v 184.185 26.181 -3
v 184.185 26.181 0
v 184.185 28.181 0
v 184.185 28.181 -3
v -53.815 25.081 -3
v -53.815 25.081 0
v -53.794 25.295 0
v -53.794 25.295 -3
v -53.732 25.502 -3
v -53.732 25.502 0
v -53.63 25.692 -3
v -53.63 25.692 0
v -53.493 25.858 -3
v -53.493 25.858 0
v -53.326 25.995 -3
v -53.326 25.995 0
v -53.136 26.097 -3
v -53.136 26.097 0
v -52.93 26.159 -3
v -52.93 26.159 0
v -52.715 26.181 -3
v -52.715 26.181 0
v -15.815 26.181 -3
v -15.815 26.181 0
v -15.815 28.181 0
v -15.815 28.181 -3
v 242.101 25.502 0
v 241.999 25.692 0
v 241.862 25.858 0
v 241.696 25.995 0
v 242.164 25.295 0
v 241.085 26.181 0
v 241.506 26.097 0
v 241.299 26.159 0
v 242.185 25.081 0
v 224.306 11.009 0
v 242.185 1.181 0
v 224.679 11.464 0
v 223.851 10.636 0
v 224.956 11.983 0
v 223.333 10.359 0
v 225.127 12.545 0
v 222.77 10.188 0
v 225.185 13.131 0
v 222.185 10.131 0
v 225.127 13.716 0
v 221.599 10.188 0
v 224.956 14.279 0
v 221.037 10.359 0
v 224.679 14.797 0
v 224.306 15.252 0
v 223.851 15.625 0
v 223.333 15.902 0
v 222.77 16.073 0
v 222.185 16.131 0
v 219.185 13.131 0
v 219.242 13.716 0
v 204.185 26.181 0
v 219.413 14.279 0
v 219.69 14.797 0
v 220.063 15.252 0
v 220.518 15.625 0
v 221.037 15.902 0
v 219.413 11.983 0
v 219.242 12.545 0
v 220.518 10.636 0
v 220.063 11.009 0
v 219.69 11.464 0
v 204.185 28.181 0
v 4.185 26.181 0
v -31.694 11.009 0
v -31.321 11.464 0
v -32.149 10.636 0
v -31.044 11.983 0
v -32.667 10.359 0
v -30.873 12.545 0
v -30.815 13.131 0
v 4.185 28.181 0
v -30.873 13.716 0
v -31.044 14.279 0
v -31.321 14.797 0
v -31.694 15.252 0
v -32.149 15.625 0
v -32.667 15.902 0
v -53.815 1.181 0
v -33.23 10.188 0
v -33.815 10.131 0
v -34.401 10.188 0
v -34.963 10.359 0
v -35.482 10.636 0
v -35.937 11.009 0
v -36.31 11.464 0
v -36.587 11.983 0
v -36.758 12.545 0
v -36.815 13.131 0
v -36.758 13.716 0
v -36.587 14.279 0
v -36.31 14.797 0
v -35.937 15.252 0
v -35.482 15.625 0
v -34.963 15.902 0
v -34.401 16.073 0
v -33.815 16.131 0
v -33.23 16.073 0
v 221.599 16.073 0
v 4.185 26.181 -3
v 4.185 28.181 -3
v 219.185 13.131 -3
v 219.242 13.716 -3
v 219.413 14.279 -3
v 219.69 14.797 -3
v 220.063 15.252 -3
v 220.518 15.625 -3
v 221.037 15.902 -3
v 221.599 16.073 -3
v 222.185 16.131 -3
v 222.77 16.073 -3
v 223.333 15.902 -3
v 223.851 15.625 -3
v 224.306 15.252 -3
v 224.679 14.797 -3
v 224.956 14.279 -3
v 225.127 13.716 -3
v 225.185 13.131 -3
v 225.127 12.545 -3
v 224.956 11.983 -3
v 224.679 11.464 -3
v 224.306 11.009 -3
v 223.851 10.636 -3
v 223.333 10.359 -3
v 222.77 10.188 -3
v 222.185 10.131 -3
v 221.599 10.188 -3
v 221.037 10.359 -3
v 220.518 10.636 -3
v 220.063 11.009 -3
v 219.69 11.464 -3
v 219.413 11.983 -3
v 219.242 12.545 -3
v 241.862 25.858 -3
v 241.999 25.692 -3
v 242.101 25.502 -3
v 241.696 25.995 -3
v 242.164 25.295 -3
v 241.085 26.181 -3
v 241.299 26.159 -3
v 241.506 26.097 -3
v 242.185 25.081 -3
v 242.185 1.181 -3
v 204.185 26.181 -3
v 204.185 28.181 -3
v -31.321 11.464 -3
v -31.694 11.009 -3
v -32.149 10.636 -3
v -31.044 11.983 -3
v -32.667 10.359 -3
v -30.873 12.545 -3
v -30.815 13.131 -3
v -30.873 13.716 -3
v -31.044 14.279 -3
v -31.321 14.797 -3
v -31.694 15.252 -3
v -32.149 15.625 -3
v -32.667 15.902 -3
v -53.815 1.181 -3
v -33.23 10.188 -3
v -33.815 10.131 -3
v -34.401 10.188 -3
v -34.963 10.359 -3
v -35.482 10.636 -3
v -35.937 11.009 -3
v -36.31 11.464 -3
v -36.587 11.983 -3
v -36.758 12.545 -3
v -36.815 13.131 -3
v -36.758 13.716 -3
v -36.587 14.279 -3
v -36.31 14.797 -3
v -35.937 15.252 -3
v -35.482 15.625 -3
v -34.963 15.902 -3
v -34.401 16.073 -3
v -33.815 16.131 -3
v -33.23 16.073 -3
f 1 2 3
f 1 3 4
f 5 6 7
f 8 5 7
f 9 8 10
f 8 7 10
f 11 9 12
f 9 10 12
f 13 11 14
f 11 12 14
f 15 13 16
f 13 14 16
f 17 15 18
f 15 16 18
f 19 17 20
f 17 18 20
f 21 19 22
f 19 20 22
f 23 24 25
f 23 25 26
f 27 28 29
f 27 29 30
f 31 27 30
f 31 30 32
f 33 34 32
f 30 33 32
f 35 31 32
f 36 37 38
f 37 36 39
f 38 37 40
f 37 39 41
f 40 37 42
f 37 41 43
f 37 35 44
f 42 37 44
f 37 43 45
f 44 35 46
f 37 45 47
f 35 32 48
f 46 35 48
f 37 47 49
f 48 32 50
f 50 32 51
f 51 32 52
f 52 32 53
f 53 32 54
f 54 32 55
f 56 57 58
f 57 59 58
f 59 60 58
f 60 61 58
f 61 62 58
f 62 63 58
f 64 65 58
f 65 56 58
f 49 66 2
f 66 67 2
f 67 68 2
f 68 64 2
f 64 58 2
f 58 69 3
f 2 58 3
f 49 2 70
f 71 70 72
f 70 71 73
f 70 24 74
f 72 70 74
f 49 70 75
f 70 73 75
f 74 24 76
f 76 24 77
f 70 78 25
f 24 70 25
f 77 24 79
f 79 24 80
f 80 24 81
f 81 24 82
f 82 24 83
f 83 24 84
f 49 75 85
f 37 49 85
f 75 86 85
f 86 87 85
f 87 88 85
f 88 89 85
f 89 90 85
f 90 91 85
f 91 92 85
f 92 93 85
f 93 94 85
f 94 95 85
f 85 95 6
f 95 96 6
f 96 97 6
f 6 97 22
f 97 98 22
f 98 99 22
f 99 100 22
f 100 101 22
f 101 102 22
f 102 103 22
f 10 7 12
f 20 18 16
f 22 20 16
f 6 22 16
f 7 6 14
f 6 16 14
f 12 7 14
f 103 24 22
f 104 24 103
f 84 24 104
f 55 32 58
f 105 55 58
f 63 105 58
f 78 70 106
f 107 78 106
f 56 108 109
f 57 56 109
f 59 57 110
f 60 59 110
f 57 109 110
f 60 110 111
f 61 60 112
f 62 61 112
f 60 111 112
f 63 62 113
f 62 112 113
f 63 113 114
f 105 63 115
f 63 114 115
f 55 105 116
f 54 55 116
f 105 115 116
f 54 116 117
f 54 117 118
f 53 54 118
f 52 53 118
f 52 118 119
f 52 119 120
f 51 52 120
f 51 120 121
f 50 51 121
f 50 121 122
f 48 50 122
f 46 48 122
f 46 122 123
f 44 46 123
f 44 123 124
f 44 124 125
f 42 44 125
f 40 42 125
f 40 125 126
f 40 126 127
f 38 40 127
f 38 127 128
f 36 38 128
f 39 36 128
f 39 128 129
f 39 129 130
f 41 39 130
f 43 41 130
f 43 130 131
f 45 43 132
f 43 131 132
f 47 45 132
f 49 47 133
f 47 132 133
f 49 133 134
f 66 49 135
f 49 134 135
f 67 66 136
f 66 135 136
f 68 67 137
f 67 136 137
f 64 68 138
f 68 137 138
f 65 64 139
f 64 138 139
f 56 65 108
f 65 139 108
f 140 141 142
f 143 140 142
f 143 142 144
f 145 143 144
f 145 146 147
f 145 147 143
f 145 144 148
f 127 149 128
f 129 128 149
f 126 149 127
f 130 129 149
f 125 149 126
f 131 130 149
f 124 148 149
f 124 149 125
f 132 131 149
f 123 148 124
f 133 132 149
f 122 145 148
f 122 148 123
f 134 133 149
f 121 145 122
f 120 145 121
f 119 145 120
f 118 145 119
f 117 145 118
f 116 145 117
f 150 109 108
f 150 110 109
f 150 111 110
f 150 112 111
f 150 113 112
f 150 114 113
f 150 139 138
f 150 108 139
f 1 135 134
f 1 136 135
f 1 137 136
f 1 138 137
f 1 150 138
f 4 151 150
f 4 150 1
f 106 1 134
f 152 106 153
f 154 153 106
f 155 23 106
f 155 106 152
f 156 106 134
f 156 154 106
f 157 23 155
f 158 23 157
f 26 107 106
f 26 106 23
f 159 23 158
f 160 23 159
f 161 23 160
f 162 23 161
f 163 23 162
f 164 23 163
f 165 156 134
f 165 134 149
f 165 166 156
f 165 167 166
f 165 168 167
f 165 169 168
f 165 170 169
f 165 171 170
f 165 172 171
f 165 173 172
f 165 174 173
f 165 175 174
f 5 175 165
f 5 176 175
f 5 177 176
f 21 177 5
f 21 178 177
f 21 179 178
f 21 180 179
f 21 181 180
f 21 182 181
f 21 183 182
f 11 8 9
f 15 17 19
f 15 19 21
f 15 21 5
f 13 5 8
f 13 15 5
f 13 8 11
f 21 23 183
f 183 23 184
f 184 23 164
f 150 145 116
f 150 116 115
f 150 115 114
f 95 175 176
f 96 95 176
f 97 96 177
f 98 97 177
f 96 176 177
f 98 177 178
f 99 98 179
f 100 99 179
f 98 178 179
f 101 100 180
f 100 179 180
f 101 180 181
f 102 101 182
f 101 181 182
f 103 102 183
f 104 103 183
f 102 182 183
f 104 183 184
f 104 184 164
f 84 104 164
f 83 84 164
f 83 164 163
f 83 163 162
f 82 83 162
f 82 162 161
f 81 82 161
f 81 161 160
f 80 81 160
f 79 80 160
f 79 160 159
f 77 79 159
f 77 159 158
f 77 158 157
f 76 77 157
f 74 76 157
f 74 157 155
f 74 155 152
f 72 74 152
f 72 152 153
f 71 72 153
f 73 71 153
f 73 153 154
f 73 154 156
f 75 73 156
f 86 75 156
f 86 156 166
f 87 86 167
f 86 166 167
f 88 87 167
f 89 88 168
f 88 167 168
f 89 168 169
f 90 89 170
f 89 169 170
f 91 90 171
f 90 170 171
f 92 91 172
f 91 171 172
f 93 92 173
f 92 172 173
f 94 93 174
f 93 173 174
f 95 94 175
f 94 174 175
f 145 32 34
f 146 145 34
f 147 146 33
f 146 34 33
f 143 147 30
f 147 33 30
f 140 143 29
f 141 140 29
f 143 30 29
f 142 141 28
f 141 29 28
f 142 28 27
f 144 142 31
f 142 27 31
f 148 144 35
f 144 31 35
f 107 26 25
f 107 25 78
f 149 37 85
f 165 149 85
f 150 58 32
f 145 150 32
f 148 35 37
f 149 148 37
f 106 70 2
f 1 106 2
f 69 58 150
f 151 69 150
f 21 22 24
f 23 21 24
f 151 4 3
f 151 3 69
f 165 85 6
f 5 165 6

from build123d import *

# Parameters (mm, degrees)
SM_BASE_FLANGE_1_DEPTH = 3
SKETCH_4_W             = 20
SKETCH_4_H             = 3
EXTRUDE_1_DEPTH        = 2
SKETCH_5_R             = 3
CUT_EXTRUDE_1_DEPTH    = 10


# Sheet-metal steps are written as plain solids
with BuildPart() as part:
    # Sketch 1 → Базовая кромка1 (new body)
    with BuildSketch(Plane.XY):
        with BuildLine():
            Line((-52.715343227, 26.180564784), (241.084656773, 26.180564784))
            ThreePointArc((241.084656773, 26.180564784), (241.862474232, 25.858382243), (242.184656773, 25.080564784))
            Line((242.184656773, 25.080564784), (242.184656773, 1.180564784))
            Line((242.184656773, 1.180564784), (-53.815343227, 1.180564784))
            Line((-53.815343227, 1.180564784), (-53.815343227, 25.080564784))
            ThreePointArc((-53.815343227, 25.080564784), (-53.493160687, 25.858382243), (-52.715343227, 26.180564784))
        make_face()
    extrude(amount=-SM_BASE_FLANGE_1_DEPTH)

    # Эскиз4 → Бобышка-Вытянуть1 (add)
    with BuildSketch(Plane(origin=(0, 26.180564784, 0), x_dir=(1, 0, 0), z_dir=(0, 1, 0))):
        with Locations((-5.815343227, 1.5)):
            Rectangle(SKETCH_4_W, SKETCH_4_H)
        with Locations((194.184656773, 1.5)):
            Rectangle(SKETCH_4_W, SKETCH_4_H)
    extrude(amount=EXTRUDE_1_DEPTH)

    # Эскиз5 → Вырез-Вытянуть1 (cut)
    with BuildSketch(Plane(origin=(0, 0, -3), x_dir=(-1, 0, 0), z_dir=(0, 0, -1))):
        with Locations((-222.184656773, 13.130564784)):
            Circle(SKETCH_5_R)
        with Locations((33.815343227, 13.130564784)):
            Circle(SKETCH_5_R)
    extrude(amount=-CUT_EXTRUDE_1_DEPTH, mode=Mode.SUBTRACT)


solid = part.part
